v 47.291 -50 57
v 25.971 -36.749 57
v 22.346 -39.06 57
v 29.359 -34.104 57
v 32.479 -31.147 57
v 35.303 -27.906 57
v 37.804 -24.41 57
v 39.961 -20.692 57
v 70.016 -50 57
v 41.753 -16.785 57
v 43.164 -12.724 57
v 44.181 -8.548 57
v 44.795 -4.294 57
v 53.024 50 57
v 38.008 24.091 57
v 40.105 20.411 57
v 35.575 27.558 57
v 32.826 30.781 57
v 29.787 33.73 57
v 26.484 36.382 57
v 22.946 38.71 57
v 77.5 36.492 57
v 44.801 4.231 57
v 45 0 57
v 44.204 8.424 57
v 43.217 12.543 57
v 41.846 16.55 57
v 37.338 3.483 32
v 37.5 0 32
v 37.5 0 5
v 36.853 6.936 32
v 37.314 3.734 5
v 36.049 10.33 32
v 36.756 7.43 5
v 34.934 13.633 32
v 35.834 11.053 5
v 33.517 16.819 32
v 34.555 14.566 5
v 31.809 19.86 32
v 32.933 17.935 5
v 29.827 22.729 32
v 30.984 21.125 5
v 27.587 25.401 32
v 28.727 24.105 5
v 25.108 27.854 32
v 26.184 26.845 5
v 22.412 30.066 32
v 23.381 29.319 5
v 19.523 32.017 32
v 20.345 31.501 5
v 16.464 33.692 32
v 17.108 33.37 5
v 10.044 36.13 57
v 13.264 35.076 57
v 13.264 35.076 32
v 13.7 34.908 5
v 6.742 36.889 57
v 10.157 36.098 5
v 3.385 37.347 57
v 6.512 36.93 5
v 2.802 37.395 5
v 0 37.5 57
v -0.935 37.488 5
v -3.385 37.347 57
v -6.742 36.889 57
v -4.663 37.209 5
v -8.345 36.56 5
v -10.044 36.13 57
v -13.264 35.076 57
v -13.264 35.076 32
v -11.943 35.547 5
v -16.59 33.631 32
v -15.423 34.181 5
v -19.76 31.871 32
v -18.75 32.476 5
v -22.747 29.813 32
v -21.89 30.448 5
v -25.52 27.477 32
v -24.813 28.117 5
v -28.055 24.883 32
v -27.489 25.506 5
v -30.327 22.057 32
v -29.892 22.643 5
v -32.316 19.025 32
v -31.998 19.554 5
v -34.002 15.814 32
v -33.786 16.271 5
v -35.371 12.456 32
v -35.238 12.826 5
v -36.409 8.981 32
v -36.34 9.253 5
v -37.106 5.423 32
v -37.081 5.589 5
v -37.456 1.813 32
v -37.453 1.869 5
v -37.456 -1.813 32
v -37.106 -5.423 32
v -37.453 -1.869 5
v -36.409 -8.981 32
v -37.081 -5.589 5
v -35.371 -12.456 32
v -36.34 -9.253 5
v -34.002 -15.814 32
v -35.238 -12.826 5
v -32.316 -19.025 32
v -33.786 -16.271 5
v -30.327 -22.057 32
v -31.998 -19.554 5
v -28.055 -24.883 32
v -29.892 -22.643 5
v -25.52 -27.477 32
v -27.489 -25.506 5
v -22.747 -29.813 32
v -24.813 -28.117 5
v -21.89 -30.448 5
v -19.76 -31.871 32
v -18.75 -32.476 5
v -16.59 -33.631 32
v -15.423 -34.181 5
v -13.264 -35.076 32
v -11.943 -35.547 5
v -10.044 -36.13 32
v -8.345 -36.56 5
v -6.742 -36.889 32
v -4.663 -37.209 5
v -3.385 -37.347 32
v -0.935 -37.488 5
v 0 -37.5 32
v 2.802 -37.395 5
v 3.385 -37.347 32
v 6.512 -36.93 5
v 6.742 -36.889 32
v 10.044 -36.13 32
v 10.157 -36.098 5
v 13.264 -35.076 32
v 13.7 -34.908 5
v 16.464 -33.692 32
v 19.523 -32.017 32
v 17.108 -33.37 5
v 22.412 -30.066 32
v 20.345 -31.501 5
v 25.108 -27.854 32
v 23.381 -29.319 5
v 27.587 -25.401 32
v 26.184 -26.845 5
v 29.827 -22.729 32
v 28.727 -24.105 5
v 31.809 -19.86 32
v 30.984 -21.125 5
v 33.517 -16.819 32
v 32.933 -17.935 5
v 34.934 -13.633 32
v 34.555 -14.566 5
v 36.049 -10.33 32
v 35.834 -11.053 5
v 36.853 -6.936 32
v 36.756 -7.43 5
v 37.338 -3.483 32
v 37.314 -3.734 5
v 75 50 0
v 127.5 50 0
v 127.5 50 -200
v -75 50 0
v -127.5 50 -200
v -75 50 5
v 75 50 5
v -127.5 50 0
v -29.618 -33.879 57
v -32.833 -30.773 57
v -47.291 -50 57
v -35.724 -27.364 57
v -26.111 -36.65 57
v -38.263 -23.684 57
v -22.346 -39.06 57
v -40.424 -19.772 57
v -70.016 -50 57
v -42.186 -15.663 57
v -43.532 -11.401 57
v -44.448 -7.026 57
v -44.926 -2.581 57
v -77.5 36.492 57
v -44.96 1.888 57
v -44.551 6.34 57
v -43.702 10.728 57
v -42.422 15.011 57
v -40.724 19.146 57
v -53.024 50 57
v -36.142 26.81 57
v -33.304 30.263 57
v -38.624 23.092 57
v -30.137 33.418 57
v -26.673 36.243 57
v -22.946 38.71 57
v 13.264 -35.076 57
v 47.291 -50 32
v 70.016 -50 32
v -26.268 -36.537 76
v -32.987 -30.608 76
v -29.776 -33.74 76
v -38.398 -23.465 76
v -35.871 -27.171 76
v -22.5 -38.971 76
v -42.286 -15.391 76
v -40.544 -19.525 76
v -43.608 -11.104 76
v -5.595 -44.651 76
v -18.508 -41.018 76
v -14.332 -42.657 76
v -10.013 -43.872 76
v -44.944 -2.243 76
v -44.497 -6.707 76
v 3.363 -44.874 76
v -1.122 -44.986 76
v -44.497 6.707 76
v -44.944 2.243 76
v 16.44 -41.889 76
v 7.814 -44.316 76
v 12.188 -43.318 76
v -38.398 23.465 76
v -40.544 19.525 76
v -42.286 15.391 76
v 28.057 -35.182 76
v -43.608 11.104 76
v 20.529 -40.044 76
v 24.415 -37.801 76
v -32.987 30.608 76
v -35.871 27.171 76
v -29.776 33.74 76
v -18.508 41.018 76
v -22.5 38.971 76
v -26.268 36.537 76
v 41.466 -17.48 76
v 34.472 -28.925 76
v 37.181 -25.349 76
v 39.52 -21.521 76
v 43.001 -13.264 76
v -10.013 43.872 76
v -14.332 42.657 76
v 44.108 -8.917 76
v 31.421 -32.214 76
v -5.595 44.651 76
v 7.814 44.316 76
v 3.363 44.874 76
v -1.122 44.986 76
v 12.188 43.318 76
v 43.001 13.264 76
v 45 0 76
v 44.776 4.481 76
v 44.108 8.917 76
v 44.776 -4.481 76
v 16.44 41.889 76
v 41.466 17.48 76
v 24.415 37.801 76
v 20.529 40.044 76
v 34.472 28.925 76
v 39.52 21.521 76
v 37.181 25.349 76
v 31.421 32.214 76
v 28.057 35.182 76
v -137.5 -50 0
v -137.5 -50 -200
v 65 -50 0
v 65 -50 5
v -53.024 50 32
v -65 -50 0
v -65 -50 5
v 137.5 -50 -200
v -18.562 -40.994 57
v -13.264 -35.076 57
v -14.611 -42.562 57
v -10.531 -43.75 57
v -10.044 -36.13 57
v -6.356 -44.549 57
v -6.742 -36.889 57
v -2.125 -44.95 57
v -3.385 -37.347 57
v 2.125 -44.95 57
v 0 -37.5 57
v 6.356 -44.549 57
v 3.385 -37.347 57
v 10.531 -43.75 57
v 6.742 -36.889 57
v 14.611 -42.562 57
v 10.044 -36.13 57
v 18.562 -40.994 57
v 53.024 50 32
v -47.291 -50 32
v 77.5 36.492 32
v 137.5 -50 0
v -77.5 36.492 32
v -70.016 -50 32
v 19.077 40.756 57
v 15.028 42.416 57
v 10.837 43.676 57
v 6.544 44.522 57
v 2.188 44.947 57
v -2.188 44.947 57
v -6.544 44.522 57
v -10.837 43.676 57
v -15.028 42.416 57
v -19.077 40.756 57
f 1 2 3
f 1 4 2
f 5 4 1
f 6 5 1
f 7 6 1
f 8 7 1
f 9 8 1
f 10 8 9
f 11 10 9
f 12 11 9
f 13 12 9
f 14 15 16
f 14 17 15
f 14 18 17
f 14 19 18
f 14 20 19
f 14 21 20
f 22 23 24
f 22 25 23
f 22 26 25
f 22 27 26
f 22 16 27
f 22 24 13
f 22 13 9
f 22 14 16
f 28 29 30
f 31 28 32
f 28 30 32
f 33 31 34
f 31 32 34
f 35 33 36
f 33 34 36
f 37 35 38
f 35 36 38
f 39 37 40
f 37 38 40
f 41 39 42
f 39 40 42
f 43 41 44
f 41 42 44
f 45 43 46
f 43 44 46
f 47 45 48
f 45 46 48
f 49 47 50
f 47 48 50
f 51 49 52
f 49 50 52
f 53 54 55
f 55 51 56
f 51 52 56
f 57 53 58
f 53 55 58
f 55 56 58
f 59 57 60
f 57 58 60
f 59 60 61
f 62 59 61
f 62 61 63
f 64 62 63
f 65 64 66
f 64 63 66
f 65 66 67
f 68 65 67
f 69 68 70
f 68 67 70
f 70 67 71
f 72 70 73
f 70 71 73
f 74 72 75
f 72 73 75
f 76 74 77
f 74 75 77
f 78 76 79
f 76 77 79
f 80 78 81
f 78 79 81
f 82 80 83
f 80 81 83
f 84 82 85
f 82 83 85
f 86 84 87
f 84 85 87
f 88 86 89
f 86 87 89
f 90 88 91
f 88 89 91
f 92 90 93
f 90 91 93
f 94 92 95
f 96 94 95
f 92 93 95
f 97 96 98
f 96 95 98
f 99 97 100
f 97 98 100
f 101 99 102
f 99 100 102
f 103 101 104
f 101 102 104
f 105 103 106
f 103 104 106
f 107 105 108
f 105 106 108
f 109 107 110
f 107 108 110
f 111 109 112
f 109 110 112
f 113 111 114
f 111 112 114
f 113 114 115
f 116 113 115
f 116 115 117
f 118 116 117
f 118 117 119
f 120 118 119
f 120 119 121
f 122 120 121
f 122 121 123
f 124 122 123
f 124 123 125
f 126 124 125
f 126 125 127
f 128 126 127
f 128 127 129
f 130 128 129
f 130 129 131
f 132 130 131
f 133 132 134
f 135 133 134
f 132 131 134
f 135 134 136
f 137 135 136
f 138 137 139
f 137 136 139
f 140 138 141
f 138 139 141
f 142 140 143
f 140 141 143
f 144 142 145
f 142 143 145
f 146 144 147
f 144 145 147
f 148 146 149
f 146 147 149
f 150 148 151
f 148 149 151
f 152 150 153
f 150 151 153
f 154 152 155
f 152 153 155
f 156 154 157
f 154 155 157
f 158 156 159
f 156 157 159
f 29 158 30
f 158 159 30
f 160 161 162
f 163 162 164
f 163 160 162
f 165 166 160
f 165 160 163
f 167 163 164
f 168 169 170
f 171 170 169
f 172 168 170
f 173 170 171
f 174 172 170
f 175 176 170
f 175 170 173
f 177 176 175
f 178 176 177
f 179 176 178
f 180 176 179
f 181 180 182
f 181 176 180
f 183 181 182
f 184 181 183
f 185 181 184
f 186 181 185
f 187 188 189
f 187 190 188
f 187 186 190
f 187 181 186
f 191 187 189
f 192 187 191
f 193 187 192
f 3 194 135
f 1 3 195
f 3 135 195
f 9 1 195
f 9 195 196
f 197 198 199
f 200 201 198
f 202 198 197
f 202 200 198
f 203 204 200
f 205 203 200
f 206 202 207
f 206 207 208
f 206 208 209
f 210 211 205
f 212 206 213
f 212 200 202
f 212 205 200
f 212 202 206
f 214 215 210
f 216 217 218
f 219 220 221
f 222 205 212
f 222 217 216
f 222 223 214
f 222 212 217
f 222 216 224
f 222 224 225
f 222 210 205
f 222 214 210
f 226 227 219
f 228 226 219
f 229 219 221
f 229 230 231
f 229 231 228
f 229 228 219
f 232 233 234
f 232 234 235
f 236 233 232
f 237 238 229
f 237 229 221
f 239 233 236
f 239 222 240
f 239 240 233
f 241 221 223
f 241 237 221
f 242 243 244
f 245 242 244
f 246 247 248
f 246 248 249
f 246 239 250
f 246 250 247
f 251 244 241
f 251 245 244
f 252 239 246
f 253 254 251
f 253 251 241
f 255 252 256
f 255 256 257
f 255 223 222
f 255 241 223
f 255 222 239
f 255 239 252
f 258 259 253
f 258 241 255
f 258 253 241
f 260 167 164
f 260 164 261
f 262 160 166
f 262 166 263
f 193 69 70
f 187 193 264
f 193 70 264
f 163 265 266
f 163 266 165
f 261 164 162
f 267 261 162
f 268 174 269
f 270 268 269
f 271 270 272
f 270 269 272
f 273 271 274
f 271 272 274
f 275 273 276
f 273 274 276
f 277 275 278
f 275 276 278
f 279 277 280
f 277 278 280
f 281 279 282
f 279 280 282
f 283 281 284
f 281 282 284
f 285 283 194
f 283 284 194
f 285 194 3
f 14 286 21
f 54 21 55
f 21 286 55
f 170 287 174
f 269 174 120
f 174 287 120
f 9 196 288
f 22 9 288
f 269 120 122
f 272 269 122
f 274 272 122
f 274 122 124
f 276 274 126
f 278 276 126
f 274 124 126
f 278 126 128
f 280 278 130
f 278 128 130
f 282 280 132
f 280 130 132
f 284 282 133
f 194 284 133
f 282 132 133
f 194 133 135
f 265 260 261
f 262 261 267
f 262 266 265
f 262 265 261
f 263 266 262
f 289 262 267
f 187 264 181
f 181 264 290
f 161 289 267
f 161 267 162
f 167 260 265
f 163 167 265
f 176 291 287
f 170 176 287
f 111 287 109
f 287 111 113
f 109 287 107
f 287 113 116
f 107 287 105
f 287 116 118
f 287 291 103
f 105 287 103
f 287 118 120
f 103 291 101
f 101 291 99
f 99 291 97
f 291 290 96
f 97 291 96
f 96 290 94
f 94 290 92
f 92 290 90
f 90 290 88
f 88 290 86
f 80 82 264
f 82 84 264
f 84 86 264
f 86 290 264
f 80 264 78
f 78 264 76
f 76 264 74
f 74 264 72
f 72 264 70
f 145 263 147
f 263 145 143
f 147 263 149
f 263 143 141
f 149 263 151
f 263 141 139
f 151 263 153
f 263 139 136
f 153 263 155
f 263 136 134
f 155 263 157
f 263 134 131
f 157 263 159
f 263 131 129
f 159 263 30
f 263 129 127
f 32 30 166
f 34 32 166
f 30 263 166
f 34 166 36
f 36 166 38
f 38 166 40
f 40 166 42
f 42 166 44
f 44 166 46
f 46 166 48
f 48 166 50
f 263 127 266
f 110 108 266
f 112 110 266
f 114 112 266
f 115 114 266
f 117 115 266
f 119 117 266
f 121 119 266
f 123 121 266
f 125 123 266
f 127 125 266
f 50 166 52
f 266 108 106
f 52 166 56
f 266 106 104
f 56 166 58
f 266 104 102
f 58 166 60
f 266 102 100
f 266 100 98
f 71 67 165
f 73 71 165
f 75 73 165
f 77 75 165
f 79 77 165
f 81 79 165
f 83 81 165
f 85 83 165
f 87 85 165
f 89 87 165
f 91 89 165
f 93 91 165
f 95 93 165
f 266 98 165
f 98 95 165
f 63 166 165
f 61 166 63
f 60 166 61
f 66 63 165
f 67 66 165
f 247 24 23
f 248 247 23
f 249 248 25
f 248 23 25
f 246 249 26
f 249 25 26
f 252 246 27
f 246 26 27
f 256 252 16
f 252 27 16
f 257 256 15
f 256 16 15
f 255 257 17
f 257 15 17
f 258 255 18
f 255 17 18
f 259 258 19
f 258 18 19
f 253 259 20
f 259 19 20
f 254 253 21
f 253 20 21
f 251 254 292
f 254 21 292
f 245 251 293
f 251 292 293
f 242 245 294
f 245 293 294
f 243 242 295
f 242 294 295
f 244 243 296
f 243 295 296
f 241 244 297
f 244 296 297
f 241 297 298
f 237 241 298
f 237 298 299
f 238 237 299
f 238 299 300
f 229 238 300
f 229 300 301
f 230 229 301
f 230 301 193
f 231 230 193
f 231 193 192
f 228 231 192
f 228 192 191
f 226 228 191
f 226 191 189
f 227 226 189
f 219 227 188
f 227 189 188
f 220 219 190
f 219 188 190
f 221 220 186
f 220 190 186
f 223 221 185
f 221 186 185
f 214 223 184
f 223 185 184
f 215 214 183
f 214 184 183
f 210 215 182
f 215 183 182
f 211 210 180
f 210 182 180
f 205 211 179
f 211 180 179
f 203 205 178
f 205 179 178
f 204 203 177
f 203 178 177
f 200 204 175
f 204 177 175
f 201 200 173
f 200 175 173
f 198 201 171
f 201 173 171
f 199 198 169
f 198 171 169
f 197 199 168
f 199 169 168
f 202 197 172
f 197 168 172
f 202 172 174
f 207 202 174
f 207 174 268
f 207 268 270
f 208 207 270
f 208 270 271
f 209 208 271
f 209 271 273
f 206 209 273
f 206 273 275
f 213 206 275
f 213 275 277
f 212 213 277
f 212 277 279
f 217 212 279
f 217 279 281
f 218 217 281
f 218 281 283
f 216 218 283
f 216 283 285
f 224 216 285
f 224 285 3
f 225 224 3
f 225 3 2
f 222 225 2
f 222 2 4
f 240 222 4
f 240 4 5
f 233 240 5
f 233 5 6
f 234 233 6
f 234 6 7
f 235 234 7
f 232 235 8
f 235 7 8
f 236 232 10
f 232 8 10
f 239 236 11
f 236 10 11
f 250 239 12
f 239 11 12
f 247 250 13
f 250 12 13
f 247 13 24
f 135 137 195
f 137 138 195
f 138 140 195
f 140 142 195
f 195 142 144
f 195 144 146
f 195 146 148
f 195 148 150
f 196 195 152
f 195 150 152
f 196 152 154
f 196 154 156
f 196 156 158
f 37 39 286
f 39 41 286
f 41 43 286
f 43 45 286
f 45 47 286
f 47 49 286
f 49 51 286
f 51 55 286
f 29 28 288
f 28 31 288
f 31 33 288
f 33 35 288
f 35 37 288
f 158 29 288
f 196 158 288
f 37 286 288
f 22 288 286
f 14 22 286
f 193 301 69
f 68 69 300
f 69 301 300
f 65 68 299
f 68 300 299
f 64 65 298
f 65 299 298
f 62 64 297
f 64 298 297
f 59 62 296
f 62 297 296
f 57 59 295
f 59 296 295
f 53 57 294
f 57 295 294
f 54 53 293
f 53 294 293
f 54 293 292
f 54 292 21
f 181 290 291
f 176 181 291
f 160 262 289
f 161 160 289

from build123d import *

# Parameters (mm, degrees)
BOSS_EXTRUDE1_DEPTH = 200
BOSS_EXTRUDE2_DEPTH = 5
SKETCH3_R           = 37.5
BOSS_EXTRUDE3_DEPTH = 27
SKETCH4_R           = 37.5
BOSS_EXTRUDE4_DEPTH = 25
SKETCH5_R           = 45
BOSS_EXTRUDE5_DEPTH = 19


with BuildPart() as part:
    # Sketch1 → Boss-Extrude1 (new body)
    with BuildSketch(Plane.XY):
        Polygon((-127.5, 50), (-137.5, -50), (137.5, -50), (127.5, 50), align=None)
    extrude(amount=-BOSS_EXTRUDE1_DEPTH)

    # Sketch2 → Boss-Extrude2 (add)
    with BuildSketch(Plane(origin=(0, 0, 0), x_dir=(-1, 0, 0), z_dir=(0, 0, -1))):
        Polygon((-75, 50), (-65, -50), (65, -50), (75, 50), align=None)
    extrude(amount=-BOSS_EXTRUDE2_DEPTH)

    # Sketch3 → Boss-Extrude3 (add)
    with BuildSketch(Plane.XY.offset(5)):
        Circle(SKETCH3_R)
    extrude(amount=BOSS_EXTRUDE3_DEPTH)

    # Sketch4 → Boss-Extrude4 (add)
    with BuildSketch(Plane.XY.offset(32)):
        with BuildLine():
            ThreePointArc((-13.263603946, -35.076014745), (-37.5, 0), (-13.263603946, 35.076014745))
            Line((-13.263603946, 35.076014745), (-53.023534566, 50))
            Line((-53.023534566, 50), (-77.5, 36.492065403))
            Line((-77.5, 36.492065403), (-70.015632516, -50))
            Line((-70.015632516, -50), (-47.291260559, -50))
            Line((-47.291260559, -50), (-13.263603946, -35.076014745))
        make_face()
        Circle(SKETCH4_R)
        with BuildLine():
            Line((53.023534566, 50), (13.263603946, 35.076014745))
            ThreePointArc((13.263603946, 35.076014745), (30.851540869, 21.317420717), (37.5, 0))
            ThreePointArc((37.5, 0), (30.851540869, -21.317420717), (13.263603946, -35.076014745))
            Line((13.263603946, -35.076014745), (47.291260559, -50))
            Line((47.291260559, -50), (70.015632516, -50))
            Line((70.015632516, -50), (77.5, 36.492065403))
            Line((77.5, 36.492065403), (53.023534566, 50))
        make_face()
    extrude(amount=BOSS_EXTRUDE4_DEPTH)

    # Sketch5 → Boss-Extrude5 (add)
    with BuildSketch(Plane.XY.offset(57)):
        Circle(SKETCH5_R)
    extrude(amount=BOSS_EXTRUDE5_DEPTH)


solid = part.part
